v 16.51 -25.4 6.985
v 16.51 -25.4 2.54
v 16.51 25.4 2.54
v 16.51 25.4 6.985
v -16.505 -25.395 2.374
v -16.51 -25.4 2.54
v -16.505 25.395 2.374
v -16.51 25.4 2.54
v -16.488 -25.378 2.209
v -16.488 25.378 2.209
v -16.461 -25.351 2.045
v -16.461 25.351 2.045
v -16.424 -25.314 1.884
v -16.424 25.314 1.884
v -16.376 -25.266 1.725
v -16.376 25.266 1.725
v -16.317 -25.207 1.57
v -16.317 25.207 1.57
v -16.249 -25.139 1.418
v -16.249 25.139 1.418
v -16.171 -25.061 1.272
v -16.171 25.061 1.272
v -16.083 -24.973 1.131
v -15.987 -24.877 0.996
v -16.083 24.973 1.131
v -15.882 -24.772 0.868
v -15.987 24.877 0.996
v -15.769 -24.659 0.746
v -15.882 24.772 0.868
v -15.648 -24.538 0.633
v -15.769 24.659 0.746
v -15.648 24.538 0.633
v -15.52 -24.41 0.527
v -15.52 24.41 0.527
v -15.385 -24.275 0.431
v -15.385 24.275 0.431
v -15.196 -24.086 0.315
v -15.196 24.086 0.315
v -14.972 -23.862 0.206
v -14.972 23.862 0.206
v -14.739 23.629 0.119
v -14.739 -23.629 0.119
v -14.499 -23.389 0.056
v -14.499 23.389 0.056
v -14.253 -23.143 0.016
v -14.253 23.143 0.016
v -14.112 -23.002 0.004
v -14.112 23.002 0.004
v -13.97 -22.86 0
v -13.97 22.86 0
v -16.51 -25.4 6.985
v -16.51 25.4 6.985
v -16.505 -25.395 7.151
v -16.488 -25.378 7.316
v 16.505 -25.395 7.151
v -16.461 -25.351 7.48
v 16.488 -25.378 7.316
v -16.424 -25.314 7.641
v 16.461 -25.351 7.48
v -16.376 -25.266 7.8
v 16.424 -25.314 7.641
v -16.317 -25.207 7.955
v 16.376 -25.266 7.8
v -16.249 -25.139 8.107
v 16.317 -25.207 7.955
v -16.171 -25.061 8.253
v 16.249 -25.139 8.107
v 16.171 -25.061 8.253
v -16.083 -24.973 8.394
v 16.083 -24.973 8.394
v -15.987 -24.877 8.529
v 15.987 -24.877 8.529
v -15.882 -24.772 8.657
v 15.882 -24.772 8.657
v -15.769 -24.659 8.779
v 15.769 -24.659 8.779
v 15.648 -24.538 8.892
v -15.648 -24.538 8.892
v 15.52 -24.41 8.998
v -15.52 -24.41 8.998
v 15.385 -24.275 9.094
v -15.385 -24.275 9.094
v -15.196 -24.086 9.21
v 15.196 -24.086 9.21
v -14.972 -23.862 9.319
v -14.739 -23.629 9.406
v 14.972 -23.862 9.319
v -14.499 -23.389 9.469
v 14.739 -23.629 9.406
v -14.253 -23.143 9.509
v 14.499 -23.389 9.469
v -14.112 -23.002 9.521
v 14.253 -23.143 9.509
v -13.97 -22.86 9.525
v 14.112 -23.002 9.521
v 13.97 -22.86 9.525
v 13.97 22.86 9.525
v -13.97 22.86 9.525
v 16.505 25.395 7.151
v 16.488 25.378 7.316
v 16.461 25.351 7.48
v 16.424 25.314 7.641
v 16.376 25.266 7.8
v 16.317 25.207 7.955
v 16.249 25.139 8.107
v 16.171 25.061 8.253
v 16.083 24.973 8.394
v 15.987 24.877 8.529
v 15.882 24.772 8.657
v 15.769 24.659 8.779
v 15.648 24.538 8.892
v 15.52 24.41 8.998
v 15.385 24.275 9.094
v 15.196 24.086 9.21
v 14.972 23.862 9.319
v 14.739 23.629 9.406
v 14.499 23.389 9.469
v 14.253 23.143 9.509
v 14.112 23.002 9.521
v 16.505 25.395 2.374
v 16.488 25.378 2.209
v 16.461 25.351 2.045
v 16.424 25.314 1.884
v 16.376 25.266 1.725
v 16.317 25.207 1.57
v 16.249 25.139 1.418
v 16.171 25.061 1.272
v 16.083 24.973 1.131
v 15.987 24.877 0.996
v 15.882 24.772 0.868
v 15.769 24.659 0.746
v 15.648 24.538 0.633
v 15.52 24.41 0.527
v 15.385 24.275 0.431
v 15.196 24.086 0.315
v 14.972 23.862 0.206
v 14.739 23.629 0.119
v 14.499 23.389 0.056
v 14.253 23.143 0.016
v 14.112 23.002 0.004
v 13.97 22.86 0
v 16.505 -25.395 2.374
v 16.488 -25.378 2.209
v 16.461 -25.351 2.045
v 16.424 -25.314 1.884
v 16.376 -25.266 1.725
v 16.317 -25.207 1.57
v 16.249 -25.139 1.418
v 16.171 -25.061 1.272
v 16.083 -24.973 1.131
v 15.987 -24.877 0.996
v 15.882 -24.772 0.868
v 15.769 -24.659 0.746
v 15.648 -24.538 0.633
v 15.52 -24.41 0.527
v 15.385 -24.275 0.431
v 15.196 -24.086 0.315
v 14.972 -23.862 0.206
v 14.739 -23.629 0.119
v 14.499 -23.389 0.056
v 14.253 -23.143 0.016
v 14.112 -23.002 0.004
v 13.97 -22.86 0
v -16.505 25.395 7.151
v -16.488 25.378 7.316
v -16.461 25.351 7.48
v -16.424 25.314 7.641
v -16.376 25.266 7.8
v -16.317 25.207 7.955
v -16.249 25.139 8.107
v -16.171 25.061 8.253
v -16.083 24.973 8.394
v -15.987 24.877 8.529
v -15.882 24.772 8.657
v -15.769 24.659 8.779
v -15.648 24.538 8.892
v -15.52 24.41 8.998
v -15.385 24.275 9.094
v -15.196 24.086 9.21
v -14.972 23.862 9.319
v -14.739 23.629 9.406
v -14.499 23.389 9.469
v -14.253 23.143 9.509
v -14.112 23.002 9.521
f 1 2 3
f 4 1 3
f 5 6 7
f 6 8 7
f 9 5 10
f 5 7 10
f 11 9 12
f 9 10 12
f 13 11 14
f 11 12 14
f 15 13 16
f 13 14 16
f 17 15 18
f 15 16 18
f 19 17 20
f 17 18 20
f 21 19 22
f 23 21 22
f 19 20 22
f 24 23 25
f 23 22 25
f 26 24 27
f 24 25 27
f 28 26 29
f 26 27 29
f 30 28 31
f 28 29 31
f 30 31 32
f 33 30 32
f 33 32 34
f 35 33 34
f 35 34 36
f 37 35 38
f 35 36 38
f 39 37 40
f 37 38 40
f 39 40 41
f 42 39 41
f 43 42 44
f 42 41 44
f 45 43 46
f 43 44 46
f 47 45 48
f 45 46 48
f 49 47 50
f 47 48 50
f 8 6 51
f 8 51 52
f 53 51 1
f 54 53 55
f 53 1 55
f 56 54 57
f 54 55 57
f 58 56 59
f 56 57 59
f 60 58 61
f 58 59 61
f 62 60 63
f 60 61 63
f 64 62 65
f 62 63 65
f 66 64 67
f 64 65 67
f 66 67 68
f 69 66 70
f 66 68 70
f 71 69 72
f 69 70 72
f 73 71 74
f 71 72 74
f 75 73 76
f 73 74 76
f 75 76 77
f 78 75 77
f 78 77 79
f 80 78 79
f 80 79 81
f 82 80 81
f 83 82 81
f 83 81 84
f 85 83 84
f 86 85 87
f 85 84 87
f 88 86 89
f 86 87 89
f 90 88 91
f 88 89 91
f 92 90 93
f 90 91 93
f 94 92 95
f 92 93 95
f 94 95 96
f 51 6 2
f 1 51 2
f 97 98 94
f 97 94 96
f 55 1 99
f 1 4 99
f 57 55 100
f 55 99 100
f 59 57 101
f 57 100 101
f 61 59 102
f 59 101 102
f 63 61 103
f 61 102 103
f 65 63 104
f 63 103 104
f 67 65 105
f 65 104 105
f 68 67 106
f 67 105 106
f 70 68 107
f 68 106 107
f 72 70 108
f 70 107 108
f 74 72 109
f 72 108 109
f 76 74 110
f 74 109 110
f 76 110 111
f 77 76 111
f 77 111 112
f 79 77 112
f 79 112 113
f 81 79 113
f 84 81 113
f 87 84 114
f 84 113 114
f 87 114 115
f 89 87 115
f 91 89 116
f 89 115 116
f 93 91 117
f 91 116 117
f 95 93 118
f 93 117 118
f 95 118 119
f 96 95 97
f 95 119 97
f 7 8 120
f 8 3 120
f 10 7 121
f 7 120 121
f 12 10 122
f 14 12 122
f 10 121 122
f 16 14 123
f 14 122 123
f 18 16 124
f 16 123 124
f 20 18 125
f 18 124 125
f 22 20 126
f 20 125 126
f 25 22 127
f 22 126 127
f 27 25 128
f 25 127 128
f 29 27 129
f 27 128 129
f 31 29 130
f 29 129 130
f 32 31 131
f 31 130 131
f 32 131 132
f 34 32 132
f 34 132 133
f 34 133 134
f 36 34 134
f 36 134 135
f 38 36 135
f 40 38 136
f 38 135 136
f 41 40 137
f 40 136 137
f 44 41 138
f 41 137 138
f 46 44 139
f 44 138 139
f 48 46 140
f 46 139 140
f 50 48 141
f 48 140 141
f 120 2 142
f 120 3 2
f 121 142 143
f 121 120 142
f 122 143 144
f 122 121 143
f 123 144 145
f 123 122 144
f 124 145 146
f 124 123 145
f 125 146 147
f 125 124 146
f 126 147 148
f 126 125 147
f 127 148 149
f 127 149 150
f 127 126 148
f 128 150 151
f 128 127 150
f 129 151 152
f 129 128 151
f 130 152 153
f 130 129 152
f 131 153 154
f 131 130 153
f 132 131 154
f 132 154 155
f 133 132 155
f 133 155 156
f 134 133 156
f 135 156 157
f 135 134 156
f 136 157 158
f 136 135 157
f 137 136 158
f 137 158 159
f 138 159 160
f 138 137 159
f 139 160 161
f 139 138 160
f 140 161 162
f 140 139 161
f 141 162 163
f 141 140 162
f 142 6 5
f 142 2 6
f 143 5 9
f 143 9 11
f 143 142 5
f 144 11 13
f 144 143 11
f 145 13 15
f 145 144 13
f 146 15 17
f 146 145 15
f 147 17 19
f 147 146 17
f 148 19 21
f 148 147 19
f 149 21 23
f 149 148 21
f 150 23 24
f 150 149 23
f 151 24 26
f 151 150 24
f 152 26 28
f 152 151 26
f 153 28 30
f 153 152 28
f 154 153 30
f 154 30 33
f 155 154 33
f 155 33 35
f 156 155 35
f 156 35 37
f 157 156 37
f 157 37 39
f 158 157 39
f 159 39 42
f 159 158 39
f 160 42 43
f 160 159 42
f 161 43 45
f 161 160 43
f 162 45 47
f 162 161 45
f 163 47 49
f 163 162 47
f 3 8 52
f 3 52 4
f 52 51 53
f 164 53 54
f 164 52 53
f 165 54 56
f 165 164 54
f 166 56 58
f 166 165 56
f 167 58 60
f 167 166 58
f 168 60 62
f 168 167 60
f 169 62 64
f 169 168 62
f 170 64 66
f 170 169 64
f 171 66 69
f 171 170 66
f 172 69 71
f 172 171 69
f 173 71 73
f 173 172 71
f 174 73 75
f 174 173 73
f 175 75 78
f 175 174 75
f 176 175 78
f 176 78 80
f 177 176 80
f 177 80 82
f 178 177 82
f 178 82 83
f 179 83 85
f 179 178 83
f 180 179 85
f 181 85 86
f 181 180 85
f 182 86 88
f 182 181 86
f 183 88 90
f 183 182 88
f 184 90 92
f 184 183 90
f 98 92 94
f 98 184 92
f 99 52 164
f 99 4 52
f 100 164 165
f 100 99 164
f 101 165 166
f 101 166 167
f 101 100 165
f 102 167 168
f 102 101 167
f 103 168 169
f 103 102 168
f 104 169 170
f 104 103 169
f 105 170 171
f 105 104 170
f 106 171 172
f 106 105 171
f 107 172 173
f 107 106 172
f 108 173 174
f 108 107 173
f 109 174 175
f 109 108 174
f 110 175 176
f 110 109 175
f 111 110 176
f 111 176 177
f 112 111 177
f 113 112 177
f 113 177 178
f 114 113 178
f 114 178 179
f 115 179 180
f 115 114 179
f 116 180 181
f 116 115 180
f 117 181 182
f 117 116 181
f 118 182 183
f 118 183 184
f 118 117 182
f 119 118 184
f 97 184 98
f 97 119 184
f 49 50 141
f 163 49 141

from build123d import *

# Parameters (mm, degrees)
SKETCH1_W           = 33.02
SKETCH1_H           = 50.8
BOSS_EXTRUDE1_DEPTH = 9.525
FILLET1_R           = 2.54


with BuildPart() as part:
    # Sketch1 → Boss-Extrude1 (new body)
    with BuildSketch(Plane.XY):
        Rectangle(SKETCH1_W, SKETCH1_H)
    extrude(amount=BOSS_EXTRUDE1_DEPTH)

    # Fillet1
    fillet1_edges = [part.edges().sort_by_distance(p)[0] for p in [
        (16.51, 0, 9.525),
        (0, 25.4, 9.525),
        (-16.51, 0, 9.525),
        (0, 25.4, 0),
        (16.51, 0, 0),
        (0, -25.4, 0),
        (-16.51, 0, 0),
        (0, -25.4, 9.525),
    ]]
    fillet(fillet1_edges, radius=FILLET1_R)


solid = part.part
